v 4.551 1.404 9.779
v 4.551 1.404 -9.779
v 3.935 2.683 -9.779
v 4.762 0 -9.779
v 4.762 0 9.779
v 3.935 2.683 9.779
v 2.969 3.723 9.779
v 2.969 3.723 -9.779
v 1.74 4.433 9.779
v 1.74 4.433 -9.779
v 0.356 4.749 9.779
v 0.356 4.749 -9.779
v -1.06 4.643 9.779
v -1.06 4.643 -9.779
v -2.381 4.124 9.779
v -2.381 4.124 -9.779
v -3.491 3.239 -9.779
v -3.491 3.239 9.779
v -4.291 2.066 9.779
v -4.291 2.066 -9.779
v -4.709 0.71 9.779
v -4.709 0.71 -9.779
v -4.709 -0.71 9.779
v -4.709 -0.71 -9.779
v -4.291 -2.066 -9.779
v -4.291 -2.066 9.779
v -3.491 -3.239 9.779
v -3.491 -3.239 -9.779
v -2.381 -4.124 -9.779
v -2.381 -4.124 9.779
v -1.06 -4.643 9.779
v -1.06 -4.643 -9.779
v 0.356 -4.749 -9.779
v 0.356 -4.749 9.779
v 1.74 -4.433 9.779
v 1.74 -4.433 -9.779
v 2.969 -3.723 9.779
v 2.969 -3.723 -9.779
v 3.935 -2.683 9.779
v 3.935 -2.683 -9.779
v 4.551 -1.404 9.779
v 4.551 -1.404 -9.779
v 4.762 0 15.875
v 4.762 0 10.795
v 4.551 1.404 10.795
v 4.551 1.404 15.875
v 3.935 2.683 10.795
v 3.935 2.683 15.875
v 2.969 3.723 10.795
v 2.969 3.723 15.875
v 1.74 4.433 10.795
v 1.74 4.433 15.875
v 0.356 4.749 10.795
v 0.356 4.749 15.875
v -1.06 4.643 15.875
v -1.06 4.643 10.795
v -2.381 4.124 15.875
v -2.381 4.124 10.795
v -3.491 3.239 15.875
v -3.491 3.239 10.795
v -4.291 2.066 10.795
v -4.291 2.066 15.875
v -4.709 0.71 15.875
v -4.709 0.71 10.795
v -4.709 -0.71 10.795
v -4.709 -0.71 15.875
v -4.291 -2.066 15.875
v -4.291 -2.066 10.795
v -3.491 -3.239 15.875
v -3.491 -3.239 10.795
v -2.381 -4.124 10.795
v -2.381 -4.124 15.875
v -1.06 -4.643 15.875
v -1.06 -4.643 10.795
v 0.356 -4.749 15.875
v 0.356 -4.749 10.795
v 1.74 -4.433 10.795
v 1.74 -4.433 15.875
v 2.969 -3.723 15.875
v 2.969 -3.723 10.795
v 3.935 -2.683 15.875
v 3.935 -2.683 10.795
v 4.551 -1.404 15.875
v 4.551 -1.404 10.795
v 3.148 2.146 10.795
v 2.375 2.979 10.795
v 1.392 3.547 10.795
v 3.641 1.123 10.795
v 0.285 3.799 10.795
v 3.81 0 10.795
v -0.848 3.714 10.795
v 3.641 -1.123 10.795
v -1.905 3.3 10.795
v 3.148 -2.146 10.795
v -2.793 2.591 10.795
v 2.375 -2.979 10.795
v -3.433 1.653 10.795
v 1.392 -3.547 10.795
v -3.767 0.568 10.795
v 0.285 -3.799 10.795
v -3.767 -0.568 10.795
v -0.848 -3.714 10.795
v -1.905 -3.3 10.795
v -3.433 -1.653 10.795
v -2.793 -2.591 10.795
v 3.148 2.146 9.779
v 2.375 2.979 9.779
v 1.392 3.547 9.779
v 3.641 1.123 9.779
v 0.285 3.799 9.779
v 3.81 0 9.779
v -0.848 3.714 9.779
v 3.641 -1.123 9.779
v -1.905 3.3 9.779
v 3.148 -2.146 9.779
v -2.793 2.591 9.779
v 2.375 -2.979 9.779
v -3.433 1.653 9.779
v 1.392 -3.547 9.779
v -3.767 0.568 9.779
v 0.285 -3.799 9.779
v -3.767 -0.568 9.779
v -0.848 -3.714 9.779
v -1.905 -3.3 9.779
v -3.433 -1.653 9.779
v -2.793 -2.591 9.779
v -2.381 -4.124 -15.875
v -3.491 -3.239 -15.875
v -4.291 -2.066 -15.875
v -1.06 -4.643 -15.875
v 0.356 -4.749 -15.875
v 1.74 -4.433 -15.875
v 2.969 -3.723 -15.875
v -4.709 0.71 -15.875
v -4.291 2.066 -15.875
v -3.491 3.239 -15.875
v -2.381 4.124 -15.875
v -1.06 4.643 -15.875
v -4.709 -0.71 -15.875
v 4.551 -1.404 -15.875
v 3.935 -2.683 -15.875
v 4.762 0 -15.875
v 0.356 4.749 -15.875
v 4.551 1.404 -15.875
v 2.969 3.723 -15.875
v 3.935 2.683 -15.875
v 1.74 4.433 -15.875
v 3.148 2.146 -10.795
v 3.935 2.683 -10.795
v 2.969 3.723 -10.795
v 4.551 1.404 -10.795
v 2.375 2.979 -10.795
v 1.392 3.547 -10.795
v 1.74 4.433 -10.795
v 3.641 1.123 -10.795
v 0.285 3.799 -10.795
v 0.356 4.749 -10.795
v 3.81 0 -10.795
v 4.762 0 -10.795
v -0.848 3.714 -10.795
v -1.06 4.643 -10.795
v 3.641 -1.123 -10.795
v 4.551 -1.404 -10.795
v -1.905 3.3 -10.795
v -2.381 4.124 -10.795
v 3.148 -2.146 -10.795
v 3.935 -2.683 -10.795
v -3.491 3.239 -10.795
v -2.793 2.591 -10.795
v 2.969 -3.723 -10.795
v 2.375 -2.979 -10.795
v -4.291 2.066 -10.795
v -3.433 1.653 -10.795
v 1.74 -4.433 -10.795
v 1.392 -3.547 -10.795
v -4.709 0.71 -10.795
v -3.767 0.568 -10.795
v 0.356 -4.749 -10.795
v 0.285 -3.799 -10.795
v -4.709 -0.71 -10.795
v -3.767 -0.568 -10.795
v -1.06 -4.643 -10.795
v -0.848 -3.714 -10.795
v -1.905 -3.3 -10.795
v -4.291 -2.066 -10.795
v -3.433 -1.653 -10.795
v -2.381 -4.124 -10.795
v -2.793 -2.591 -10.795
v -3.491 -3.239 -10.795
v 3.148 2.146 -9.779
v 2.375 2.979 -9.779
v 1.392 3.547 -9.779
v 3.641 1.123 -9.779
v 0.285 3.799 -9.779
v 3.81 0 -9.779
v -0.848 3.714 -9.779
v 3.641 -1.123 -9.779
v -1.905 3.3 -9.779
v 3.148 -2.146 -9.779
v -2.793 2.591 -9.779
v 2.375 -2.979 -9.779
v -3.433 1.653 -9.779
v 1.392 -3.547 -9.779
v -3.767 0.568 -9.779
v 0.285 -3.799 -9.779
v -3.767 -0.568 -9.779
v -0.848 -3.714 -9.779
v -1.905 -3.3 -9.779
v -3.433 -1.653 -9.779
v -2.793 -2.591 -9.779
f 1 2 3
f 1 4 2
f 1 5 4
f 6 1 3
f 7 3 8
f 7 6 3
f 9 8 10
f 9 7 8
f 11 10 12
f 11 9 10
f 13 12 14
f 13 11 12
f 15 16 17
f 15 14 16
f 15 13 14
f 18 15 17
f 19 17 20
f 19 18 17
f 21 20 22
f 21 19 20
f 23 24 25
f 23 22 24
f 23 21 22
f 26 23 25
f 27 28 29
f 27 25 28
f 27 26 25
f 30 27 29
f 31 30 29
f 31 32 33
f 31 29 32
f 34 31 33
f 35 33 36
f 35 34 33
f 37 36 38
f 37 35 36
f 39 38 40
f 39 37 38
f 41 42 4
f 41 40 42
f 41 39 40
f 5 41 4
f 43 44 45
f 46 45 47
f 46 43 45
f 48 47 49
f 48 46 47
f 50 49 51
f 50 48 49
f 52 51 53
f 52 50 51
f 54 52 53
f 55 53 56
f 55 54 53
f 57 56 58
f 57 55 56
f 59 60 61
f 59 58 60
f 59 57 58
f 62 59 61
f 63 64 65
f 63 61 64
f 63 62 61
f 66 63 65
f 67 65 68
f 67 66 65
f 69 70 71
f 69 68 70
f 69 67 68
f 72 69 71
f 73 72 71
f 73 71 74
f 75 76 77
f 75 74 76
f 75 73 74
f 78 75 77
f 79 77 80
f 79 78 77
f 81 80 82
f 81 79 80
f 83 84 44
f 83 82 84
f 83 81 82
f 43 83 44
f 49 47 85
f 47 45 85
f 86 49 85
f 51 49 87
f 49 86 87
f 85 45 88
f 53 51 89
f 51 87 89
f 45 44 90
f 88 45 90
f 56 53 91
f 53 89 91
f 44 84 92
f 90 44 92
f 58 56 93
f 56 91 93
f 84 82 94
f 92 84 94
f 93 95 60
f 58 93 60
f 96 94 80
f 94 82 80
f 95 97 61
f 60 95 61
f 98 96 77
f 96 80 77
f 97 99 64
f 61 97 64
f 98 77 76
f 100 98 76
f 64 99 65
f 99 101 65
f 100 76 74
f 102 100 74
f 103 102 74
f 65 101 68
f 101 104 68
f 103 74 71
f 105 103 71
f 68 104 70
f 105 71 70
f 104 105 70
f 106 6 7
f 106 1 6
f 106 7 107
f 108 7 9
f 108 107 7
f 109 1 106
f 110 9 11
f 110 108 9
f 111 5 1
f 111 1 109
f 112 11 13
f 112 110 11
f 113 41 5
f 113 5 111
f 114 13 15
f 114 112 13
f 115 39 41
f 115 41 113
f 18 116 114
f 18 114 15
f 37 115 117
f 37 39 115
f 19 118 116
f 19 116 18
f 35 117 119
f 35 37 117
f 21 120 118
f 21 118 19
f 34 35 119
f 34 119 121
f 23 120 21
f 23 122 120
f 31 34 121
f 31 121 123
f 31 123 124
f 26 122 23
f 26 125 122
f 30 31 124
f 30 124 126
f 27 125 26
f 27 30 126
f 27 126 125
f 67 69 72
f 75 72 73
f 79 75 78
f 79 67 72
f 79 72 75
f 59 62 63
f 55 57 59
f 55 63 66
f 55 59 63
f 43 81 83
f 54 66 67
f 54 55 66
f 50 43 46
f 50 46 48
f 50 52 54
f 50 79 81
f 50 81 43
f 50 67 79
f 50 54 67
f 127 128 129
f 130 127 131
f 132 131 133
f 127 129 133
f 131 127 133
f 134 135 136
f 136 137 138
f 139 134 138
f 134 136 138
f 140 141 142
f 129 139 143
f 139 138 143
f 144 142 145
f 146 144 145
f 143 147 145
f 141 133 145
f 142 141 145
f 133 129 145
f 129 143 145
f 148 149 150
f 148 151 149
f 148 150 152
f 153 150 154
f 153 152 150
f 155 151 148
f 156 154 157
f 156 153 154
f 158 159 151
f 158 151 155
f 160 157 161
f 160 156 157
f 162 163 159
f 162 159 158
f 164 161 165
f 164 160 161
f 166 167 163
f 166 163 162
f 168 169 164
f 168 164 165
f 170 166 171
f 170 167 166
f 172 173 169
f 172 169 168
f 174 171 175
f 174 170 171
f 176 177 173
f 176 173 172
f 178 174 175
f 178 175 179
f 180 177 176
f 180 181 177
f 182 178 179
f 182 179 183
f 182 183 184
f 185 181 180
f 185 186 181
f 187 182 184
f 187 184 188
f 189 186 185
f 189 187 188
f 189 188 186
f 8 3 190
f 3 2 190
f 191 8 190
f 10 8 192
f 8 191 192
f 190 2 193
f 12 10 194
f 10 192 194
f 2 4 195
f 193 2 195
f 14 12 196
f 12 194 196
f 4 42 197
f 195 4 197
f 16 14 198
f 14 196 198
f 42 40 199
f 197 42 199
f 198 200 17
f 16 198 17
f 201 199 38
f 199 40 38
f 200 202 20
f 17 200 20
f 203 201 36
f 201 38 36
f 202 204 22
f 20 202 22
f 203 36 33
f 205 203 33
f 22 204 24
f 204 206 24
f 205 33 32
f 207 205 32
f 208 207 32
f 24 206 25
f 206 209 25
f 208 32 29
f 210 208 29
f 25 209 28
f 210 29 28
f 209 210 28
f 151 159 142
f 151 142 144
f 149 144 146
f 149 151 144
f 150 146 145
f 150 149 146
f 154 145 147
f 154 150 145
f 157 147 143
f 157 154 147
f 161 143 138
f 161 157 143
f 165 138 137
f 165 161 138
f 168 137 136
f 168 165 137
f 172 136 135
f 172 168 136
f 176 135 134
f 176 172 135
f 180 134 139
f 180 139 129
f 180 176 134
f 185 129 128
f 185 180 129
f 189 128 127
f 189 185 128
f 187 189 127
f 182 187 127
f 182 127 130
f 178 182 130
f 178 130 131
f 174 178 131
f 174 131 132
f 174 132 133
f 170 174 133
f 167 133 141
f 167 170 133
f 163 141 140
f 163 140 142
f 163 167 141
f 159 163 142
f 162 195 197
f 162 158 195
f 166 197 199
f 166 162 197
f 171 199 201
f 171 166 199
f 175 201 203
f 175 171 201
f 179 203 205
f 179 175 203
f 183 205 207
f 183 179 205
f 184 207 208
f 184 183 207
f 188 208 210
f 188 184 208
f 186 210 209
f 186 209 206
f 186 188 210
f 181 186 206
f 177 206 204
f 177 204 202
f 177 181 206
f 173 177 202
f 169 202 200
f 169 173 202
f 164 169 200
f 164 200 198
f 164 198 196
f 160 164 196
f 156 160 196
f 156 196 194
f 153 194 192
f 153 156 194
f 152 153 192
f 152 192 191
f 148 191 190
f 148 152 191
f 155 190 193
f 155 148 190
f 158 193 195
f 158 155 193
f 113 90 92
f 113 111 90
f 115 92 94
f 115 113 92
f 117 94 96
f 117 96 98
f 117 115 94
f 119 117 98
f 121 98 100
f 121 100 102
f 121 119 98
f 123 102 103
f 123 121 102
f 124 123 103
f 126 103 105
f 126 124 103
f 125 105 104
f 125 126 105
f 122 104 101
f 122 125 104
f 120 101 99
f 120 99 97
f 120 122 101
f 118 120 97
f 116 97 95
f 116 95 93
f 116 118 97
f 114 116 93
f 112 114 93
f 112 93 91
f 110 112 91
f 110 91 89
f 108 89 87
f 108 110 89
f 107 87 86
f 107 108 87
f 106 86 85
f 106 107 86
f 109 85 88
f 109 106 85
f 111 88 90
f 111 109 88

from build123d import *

# Parameters (mm, degrees)
SKETCH1_R           = 4.7625
BOSS_EXTRUDE1_DEPTH = 15.875
SKETCH2_W           = 0.9525
SKETCH2_H           = 1.016


with BuildPart() as part:
    # Sketch1 → Boss-Extrude1 (new body, symmetric)
    with BuildSketch(Plane.XY):
        Circle(SKETCH1_R)
    extrude(amount=BOSS_EXTRUDE1_DEPTH, both=True)

    # Sketch2 → Cut-Revolve1 (revolve, cut)
    with BuildSketch(Plane(origin=(0, 0, 0), x_dir=(1, 0, 0), z_dir=(0, 1, 0))):
        with Locations((4.28625, 10.287)):
            Rectangle(SKETCH2_W, SKETCH2_H)
        with Locations((4.28625, -10.287)):
            Rectangle(SKETCH2_W, SKETCH2_H)
    revolve(axis=Axis((0, 0, 15.875), (0, 0, -1)), mode=Mode.SUBTRACT)


solid = part.part
